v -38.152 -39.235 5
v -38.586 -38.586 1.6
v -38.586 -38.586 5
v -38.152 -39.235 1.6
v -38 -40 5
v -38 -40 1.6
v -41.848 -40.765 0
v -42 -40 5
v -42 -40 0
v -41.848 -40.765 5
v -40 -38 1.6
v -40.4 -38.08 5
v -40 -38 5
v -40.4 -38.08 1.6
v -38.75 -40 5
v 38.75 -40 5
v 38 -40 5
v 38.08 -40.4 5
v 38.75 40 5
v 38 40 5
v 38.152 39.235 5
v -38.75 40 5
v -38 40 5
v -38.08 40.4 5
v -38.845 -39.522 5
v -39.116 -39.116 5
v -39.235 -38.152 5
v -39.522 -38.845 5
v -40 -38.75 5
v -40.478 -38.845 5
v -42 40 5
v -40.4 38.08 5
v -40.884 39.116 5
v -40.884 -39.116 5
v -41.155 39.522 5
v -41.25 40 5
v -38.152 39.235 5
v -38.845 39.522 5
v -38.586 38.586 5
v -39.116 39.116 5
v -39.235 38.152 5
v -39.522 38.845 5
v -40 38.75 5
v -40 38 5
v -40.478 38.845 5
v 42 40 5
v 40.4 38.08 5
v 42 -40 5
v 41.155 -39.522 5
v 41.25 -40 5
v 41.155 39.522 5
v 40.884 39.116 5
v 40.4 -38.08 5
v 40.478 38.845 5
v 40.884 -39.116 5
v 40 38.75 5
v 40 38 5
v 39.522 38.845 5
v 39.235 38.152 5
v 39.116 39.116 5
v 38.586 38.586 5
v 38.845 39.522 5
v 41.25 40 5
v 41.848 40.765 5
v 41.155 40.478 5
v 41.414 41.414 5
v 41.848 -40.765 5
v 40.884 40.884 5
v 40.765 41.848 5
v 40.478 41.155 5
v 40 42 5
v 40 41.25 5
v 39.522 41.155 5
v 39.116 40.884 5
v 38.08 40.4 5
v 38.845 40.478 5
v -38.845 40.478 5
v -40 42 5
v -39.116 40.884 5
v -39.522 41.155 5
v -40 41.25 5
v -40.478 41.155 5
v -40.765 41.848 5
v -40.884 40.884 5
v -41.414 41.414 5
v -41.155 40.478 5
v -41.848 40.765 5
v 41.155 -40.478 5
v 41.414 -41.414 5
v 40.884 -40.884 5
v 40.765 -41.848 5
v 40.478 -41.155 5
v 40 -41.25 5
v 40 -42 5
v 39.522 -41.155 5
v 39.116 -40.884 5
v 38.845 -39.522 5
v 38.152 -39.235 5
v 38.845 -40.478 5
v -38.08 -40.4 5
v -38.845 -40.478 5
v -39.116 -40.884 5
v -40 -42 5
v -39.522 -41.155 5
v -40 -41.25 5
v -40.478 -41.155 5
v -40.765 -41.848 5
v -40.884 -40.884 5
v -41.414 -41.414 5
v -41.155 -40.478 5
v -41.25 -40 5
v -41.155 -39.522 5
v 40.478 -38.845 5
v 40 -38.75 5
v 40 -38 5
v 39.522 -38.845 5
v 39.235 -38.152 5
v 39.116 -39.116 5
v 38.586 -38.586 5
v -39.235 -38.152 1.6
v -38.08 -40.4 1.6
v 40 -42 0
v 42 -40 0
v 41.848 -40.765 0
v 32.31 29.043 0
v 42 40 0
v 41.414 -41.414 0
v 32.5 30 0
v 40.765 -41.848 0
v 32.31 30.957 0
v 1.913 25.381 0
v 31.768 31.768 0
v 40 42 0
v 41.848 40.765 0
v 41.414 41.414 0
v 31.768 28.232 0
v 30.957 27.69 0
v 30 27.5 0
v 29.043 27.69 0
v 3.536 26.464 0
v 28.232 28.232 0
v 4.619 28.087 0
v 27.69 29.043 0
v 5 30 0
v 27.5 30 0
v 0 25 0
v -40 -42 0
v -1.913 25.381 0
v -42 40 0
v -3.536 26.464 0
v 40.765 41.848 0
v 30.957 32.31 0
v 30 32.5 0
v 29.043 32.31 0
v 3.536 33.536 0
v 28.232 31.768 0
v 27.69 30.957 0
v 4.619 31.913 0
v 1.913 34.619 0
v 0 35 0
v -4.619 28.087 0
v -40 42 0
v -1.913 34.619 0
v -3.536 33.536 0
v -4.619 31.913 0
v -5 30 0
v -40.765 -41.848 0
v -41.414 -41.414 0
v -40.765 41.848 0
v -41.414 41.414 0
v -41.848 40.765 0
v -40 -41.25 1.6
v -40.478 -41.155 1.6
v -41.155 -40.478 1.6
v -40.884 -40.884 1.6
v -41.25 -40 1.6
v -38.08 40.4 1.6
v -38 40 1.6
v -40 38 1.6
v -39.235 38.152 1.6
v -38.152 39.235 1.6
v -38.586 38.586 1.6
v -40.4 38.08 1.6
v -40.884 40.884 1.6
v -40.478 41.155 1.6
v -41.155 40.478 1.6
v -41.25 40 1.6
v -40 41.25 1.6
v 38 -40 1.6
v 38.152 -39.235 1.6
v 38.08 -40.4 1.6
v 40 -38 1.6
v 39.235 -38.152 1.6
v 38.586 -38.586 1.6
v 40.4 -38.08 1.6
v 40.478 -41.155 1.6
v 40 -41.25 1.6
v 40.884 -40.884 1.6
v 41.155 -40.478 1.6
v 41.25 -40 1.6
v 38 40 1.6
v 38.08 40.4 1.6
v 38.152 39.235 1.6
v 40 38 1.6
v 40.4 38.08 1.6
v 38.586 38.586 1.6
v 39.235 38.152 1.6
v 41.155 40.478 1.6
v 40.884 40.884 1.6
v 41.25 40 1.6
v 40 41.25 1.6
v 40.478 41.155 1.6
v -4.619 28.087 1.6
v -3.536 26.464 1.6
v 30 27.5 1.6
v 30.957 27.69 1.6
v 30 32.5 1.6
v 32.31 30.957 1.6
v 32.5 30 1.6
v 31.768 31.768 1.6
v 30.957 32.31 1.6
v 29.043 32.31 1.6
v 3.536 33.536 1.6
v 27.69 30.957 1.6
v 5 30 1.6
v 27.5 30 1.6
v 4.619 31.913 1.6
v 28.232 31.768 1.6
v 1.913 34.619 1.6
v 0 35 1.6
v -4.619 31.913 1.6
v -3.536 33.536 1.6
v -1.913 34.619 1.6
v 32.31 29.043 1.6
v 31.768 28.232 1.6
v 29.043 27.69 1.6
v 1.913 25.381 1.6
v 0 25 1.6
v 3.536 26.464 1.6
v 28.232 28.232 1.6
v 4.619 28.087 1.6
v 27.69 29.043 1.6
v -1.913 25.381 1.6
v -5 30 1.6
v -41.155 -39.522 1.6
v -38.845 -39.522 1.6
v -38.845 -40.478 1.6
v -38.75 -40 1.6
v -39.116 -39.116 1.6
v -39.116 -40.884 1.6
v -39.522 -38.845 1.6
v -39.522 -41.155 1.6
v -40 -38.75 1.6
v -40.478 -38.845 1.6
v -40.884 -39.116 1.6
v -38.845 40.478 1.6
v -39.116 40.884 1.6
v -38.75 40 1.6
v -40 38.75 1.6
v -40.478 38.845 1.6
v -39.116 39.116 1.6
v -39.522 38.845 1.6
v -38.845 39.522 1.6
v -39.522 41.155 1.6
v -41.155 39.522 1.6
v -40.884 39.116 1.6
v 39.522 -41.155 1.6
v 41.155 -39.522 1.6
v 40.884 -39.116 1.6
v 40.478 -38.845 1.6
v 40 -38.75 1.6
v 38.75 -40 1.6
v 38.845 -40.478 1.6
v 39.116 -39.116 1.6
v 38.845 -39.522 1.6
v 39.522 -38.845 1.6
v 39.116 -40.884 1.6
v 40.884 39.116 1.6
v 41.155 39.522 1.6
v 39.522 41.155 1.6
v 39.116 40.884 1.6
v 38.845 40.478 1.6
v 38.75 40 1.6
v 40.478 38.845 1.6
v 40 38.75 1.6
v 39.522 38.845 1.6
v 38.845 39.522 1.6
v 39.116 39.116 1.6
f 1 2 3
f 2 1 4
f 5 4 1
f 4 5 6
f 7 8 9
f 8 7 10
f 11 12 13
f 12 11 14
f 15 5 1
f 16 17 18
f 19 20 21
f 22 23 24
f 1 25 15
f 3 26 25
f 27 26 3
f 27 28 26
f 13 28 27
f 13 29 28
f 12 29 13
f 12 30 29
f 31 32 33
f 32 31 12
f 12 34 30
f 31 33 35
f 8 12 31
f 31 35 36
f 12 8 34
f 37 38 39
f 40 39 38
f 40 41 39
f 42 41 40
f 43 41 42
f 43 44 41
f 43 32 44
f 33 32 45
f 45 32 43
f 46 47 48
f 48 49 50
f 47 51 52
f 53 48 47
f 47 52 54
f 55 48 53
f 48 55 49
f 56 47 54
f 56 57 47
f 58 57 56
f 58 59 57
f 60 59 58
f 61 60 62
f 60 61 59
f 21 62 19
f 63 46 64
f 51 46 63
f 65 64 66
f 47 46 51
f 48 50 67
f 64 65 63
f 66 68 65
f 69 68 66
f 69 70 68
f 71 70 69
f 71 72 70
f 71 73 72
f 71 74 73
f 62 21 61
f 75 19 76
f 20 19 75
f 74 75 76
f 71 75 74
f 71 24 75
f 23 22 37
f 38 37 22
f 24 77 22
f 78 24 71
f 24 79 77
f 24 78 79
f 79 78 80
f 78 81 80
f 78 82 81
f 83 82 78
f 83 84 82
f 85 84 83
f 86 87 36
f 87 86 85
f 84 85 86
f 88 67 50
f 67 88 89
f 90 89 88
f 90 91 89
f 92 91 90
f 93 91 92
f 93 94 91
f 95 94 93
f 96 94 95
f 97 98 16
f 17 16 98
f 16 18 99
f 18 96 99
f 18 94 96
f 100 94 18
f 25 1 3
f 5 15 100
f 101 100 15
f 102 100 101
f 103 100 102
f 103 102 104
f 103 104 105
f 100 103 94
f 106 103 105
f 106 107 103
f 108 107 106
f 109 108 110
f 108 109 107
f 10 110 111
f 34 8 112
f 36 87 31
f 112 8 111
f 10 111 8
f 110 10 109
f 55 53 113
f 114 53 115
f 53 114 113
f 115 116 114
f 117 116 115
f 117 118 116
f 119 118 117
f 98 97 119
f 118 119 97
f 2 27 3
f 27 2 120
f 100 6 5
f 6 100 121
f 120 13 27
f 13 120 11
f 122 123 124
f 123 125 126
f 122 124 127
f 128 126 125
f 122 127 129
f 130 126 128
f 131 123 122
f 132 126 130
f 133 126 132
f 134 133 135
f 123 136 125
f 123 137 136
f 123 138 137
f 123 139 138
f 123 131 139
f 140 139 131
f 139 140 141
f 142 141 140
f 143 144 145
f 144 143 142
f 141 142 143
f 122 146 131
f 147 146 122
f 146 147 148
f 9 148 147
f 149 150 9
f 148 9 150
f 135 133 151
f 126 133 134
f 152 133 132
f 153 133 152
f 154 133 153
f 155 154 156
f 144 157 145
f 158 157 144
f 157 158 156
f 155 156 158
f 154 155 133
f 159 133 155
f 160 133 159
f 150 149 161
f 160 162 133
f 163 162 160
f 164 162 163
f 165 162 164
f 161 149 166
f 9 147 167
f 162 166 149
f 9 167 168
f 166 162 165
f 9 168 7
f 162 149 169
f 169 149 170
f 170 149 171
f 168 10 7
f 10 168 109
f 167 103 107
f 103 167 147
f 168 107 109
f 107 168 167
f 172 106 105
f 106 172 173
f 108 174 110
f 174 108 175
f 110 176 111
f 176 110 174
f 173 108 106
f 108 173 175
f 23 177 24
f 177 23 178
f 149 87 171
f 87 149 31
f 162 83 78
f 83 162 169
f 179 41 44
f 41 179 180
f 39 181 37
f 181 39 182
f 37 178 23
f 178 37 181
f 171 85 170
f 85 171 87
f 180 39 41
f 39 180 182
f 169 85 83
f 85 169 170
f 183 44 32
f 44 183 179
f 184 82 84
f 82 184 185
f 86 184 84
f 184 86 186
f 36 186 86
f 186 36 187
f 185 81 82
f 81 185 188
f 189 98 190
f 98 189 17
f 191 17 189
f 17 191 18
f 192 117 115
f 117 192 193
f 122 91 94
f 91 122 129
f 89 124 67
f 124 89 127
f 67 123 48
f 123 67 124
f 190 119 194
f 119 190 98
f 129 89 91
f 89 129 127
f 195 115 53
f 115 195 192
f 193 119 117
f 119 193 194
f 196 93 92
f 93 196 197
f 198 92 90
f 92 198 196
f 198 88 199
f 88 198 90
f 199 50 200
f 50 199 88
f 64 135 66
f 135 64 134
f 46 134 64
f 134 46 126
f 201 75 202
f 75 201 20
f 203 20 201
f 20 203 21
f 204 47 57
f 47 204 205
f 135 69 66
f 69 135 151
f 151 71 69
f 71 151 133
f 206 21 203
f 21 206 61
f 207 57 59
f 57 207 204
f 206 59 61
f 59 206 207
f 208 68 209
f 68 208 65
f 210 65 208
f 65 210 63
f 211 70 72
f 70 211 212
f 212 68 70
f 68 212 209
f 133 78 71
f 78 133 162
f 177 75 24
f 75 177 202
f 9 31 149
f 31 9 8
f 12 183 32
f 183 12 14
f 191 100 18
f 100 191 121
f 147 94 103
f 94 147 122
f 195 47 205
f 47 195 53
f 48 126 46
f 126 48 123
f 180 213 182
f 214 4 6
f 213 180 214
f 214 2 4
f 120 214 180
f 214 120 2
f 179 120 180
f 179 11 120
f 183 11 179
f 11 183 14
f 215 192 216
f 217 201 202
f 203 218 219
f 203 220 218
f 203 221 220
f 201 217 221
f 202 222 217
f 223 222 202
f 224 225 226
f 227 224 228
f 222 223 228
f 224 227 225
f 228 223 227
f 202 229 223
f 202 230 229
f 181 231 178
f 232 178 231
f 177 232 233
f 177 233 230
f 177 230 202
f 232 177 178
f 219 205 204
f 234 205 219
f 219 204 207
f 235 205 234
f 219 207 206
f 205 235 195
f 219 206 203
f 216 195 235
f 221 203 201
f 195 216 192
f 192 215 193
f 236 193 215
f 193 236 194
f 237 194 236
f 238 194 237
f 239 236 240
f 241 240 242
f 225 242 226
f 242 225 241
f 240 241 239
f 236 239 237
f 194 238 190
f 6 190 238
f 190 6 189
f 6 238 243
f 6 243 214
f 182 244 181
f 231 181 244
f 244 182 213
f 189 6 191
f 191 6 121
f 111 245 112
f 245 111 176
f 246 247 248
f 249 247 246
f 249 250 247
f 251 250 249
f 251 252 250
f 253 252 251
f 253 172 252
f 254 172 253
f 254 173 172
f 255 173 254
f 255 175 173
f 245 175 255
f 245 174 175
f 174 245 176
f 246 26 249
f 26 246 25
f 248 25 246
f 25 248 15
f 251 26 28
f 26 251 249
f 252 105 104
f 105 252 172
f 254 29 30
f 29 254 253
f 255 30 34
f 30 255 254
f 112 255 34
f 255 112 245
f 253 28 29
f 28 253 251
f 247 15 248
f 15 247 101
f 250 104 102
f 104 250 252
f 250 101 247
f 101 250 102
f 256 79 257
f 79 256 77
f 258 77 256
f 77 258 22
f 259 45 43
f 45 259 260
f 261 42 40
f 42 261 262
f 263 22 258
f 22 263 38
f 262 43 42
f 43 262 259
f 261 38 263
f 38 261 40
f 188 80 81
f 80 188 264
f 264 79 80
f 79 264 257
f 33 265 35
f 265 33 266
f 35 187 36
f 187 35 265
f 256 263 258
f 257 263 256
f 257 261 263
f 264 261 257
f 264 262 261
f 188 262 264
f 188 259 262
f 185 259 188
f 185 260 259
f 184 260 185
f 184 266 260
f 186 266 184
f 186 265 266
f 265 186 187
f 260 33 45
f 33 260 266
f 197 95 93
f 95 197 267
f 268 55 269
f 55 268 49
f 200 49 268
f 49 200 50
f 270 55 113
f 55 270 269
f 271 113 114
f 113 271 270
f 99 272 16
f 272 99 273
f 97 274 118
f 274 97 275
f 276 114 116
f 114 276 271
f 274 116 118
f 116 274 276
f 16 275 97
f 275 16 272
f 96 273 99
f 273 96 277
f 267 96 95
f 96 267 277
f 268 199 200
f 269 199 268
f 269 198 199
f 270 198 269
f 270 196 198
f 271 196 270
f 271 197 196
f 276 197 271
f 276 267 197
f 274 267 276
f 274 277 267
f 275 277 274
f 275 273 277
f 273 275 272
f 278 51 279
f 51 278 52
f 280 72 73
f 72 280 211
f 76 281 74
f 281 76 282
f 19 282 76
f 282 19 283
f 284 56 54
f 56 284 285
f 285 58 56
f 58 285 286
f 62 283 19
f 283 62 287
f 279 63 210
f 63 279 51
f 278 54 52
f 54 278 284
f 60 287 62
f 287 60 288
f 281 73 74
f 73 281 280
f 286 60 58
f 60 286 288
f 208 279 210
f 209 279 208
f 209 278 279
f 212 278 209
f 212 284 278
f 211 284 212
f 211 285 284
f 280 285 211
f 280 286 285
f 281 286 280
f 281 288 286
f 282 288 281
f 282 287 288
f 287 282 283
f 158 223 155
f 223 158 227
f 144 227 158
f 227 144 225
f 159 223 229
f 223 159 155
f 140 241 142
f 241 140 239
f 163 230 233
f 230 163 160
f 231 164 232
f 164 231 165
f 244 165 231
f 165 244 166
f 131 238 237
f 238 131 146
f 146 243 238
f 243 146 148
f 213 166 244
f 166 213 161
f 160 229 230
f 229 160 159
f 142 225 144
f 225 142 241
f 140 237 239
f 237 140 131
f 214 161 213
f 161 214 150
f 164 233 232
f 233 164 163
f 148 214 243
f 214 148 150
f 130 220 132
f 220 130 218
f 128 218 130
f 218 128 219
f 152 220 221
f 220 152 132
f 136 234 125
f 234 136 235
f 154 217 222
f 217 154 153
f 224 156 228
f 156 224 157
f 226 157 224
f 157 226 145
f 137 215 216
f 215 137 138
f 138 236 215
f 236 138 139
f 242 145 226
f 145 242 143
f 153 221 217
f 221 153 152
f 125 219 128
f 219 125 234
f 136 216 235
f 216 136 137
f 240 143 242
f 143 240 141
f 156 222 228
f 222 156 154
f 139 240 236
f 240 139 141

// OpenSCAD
pizero_height = 5;
pizero_width = 65;
pizero_length = 30;
pizero_hole_r = 2.7/2;
pi_header_width = 51;
pi_header_length = 5;

a = 80;
border_radius = 2;
wall_thickness = 1.6;
connector_wall_thickness = 0.5;

part="top"; /* base or top */

module corner(height=15, holes=true, hole_only=false) {
    module inner() {
        translate([0,0,wall_thickness]) {
            cylinder(h=(height), r=1.25, $fn=16);
        }
    }
    if(hole_only) {
        if (holes) {
            inner();
        }
    } else {
        cylinder(h=height, r=border_radius, $fn=16);
        inner();
    }
}

module corners(holes=true, holes_only=false) {
    for(i=[-1,1]) {
        for(j=[-1,1]) {
            translate([i*(a/2), j*(a/2)]) {
                corner(height=height, holes=holes, hole_only=holes_only);
            }
        }
    }
}

module pizero_connectors() {
    translate([0,-(a/2)-wall_thickness/2+connector_wall_thickness,pizero_height/2+wall_thickness]) {
        difference() {
            cube([pizero_width,wall_thickness, pizero_height], center=true);
            translate([0,-wall_thickness/2,pizero_height-wall_thickness]) {
                rotate([45, 0, 0]) {
                    cube([pizero_width,wall_thickness*2, wall_thickness*2], center=true);
                }
            }
        }
        for(i=[[13,12.4],[8,41.4],[8,54]]) {
            translate([-pizero_width/2+i[1],0,-pizero_height/2+3/2]) {
            cube([i[0], 10, 3],center=true);
        }
        }
    }
}

module pizero_holder() {
    translate([0, -(a/2)-wall_thickness+connector_wall_thickness+pizero_length/2, 0]) {
        translate([0,0,wall_thickness/2]) {
            cube([pizero_width, pizero_length, wall_thickness], center=true);
        }
        for (i=[-1,1]) {
            for (j=[-1,1]) {
                translate([i*pizero_width/2-i*3.5, j*pizero_length/2-j*3.5, wall_thickness])
                cylinder(h=1.5, r=pizero_hole_r, $fn=16);
            }
        }
    }
}

module pizero_header_clearance() {
    translate([0,-(a/2)-wall_thickness+connector_wall_thickness+pizero_length-pi_header_length/2-1,wall_thickness]) {
        cube([pi_header_width, pi_header_length, 2], center=true);
    }
}

module case(height=15, holes=true) {
    difference() {
        union() {
            // Corners
            corners(height=height, holes=holes);

            // Walls
            for(i=[-1,1]) {
                for(j=[0,90]) {
                    rotate([0,0,j]) {
                        translate([0,-i*(a/2 + border_radius - wall_thickness/2), height/2]) {
                            cube([a, (wall_thickness), height], center=true);
                        }
                    }
                }
            }

            // Floor
            translate([-(a+border_radius)/2, -(a+border_radius)/2]) {
                cube([a+border_radius,a+border_radius,wall_thickness]);
            }
        }
        corners(height=height, holes=holes, holes_only=true);        
    }
}

/*
pizero_holder();
pizero_connectors();
pizero_header_clearance();
*/

///*
if (part == "base") {
    difference() {
        union() {
            case(height=15, holes=false);
            pizero_holder();
        }
        pizero_connectors();
        pizero_header_clearance();
    }
} else if (part == "top") {
    difference() {
        case(height=5, holes=true);
        translate([0,30]) {
            cylinder(h=5, r=5, $fn=16);
        }
        translate([30,30]) {
            cylinder(h=5, r=2.5, $fn=16);
        }
    }
}
//*/
